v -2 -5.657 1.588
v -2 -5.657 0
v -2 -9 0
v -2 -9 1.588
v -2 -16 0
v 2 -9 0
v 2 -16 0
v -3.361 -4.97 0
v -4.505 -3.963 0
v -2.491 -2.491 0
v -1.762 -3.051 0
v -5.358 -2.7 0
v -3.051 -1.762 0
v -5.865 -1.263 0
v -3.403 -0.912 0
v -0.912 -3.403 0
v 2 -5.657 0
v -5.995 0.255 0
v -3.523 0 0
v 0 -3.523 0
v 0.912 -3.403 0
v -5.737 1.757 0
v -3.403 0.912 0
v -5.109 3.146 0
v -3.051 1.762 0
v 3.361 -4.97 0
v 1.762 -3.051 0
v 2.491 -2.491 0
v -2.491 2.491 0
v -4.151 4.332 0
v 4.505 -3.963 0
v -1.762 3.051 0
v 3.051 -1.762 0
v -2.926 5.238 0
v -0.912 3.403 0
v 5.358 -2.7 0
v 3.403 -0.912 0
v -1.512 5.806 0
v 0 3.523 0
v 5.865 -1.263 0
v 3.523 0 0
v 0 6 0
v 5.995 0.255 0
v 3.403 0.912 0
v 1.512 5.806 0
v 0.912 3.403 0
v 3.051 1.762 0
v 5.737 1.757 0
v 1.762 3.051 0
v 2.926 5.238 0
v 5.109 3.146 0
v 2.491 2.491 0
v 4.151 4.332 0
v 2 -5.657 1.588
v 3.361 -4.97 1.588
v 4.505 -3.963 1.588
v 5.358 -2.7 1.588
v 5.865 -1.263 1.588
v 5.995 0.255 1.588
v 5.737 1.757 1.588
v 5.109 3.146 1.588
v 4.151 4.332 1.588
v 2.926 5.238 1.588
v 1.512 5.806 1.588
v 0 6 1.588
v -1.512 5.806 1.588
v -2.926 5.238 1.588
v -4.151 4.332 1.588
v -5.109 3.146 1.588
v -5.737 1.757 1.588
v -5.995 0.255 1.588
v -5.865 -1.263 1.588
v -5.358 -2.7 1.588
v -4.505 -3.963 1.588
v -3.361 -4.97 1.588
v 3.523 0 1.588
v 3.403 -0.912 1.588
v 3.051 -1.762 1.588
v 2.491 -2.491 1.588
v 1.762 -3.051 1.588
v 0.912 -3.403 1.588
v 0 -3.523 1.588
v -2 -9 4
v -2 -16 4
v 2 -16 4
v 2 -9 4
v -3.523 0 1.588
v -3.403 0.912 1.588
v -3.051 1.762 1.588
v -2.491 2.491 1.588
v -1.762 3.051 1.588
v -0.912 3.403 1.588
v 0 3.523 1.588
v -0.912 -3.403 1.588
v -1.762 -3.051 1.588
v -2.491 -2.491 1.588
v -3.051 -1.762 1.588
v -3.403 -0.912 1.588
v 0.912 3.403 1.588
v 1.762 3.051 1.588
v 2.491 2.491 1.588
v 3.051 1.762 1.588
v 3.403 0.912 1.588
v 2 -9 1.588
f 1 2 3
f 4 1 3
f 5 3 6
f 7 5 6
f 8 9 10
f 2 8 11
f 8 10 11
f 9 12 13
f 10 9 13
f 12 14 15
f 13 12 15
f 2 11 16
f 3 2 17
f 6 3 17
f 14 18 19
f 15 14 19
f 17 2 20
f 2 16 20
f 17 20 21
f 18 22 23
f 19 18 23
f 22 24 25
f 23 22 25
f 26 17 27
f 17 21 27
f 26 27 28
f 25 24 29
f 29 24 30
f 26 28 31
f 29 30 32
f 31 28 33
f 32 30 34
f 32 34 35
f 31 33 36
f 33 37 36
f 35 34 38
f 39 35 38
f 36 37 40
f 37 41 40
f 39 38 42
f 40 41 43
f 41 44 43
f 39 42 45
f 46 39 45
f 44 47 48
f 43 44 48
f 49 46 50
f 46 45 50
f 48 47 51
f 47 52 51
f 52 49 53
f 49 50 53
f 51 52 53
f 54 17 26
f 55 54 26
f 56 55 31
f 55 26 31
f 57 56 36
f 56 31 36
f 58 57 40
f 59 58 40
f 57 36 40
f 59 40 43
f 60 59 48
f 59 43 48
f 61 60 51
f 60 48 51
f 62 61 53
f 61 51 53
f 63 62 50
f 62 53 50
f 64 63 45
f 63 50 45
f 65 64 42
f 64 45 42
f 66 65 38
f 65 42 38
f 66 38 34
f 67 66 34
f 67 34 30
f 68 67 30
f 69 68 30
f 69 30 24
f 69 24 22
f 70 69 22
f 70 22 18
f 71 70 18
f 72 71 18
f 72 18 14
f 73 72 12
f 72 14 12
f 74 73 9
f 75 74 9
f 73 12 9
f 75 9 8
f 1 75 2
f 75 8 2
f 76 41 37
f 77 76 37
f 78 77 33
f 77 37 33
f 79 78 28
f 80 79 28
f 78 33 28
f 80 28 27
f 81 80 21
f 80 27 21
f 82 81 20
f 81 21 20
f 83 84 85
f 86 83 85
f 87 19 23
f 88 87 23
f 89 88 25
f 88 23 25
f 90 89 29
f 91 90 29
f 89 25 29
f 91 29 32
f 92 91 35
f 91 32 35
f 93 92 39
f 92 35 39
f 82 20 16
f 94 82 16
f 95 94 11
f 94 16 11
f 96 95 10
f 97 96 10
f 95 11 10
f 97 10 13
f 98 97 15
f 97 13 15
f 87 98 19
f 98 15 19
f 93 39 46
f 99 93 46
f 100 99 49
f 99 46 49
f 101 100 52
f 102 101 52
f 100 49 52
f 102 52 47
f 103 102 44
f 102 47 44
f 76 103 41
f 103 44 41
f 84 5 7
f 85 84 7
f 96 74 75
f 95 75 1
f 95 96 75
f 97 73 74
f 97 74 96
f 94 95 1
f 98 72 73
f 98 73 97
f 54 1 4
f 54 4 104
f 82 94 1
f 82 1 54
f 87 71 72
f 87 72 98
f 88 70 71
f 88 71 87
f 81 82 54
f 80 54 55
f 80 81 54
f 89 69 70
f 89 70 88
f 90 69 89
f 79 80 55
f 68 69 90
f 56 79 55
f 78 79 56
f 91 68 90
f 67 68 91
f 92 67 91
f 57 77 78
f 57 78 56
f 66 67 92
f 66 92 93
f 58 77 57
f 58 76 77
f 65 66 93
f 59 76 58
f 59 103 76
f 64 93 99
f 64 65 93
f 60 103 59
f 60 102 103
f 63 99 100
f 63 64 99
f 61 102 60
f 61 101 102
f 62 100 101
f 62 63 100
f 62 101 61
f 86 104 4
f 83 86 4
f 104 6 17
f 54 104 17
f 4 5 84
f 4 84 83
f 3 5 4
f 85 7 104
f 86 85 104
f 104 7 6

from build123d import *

# Parameters (mm, degrees)
F1_DEPTH = 1.5875
F2_W     = 2
F2_H     = 7
F3_DEPTH = 4


# Not quite as in the source:
# - ends of sketch curves that miss each other by under 0.0002 mm in the source are joined


with BuildPart() as f1:
    # F0 (on Top) → F1 (new body)
    with BuildSketch(Plane.XY):
        with BuildLine():
            Line((-3.52345, 0), (-6, 0))
            ThreePointArc((-6, 0), (-4.8989795096, -3.4641015812), (-2.0000000784, -5.6568542218))
            Line((-2.0000000784, -5.6568542218), (-2, -9))
            Line((-2, -9), (0, -9))
            Line((0, -9), (0, -3.52345))
            ThreePointArc((0, -3.52345), (-2.4914553882, -2.4914553882), (-3.52345, 0))
        make_face()
        with BuildLine():
            ThreePointArc((2.0000000784, -5.6568542218), (4.8989795096, -3.4641015812), (6, 0))
            Line((6, 0), (3.52345, 0))
            ThreePointArc((3.52345, 0), (2.4914553882, -2.4914553882), (0, -3.52345))
            Line((0, -3.52345), (0, -9))
            Line((0, -9), (2, -9))
            Line((2, -9), (2.0000000784, -5.6568542218))
        make_face()
        with BuildLine():
            ThreePointArc((6, 0), (4.2426406871, 4.2426406871), (0, 6))
            Line((0, 6), (0, 3.52345))
            ThreePointArc((0, 3.52345), (2.4914553882, 2.4914553882), (3.52345, 0))
            Line((3.52345, 0), (6, 0))
        make_face()
        with BuildLine():
            Line((0, 3.52345), (0, 6))
            ThreePointArc((0, 6), (-4.2426406871, 4.2426406871), (-6, 0))
            Line((-6, 0), (-3.52345, 0))
            ThreePointArc((-3.52345, 0), (-2.4914553882, 2.4914553882), (0, 3.52345))
        make_face()
    extrude(amount=F1_DEPTH)

    # F2 (on Top) → F3 (join)
    with BuildSketch(Plane.XY):
        with Locations((-1, -12.5)):
            Rectangle(F2_W, F2_H)
        with Locations((1, -12.5)):
            Rectangle(F2_W, F2_H)
    extrude(amount=F3_DEPTH)


solid = f1.part
